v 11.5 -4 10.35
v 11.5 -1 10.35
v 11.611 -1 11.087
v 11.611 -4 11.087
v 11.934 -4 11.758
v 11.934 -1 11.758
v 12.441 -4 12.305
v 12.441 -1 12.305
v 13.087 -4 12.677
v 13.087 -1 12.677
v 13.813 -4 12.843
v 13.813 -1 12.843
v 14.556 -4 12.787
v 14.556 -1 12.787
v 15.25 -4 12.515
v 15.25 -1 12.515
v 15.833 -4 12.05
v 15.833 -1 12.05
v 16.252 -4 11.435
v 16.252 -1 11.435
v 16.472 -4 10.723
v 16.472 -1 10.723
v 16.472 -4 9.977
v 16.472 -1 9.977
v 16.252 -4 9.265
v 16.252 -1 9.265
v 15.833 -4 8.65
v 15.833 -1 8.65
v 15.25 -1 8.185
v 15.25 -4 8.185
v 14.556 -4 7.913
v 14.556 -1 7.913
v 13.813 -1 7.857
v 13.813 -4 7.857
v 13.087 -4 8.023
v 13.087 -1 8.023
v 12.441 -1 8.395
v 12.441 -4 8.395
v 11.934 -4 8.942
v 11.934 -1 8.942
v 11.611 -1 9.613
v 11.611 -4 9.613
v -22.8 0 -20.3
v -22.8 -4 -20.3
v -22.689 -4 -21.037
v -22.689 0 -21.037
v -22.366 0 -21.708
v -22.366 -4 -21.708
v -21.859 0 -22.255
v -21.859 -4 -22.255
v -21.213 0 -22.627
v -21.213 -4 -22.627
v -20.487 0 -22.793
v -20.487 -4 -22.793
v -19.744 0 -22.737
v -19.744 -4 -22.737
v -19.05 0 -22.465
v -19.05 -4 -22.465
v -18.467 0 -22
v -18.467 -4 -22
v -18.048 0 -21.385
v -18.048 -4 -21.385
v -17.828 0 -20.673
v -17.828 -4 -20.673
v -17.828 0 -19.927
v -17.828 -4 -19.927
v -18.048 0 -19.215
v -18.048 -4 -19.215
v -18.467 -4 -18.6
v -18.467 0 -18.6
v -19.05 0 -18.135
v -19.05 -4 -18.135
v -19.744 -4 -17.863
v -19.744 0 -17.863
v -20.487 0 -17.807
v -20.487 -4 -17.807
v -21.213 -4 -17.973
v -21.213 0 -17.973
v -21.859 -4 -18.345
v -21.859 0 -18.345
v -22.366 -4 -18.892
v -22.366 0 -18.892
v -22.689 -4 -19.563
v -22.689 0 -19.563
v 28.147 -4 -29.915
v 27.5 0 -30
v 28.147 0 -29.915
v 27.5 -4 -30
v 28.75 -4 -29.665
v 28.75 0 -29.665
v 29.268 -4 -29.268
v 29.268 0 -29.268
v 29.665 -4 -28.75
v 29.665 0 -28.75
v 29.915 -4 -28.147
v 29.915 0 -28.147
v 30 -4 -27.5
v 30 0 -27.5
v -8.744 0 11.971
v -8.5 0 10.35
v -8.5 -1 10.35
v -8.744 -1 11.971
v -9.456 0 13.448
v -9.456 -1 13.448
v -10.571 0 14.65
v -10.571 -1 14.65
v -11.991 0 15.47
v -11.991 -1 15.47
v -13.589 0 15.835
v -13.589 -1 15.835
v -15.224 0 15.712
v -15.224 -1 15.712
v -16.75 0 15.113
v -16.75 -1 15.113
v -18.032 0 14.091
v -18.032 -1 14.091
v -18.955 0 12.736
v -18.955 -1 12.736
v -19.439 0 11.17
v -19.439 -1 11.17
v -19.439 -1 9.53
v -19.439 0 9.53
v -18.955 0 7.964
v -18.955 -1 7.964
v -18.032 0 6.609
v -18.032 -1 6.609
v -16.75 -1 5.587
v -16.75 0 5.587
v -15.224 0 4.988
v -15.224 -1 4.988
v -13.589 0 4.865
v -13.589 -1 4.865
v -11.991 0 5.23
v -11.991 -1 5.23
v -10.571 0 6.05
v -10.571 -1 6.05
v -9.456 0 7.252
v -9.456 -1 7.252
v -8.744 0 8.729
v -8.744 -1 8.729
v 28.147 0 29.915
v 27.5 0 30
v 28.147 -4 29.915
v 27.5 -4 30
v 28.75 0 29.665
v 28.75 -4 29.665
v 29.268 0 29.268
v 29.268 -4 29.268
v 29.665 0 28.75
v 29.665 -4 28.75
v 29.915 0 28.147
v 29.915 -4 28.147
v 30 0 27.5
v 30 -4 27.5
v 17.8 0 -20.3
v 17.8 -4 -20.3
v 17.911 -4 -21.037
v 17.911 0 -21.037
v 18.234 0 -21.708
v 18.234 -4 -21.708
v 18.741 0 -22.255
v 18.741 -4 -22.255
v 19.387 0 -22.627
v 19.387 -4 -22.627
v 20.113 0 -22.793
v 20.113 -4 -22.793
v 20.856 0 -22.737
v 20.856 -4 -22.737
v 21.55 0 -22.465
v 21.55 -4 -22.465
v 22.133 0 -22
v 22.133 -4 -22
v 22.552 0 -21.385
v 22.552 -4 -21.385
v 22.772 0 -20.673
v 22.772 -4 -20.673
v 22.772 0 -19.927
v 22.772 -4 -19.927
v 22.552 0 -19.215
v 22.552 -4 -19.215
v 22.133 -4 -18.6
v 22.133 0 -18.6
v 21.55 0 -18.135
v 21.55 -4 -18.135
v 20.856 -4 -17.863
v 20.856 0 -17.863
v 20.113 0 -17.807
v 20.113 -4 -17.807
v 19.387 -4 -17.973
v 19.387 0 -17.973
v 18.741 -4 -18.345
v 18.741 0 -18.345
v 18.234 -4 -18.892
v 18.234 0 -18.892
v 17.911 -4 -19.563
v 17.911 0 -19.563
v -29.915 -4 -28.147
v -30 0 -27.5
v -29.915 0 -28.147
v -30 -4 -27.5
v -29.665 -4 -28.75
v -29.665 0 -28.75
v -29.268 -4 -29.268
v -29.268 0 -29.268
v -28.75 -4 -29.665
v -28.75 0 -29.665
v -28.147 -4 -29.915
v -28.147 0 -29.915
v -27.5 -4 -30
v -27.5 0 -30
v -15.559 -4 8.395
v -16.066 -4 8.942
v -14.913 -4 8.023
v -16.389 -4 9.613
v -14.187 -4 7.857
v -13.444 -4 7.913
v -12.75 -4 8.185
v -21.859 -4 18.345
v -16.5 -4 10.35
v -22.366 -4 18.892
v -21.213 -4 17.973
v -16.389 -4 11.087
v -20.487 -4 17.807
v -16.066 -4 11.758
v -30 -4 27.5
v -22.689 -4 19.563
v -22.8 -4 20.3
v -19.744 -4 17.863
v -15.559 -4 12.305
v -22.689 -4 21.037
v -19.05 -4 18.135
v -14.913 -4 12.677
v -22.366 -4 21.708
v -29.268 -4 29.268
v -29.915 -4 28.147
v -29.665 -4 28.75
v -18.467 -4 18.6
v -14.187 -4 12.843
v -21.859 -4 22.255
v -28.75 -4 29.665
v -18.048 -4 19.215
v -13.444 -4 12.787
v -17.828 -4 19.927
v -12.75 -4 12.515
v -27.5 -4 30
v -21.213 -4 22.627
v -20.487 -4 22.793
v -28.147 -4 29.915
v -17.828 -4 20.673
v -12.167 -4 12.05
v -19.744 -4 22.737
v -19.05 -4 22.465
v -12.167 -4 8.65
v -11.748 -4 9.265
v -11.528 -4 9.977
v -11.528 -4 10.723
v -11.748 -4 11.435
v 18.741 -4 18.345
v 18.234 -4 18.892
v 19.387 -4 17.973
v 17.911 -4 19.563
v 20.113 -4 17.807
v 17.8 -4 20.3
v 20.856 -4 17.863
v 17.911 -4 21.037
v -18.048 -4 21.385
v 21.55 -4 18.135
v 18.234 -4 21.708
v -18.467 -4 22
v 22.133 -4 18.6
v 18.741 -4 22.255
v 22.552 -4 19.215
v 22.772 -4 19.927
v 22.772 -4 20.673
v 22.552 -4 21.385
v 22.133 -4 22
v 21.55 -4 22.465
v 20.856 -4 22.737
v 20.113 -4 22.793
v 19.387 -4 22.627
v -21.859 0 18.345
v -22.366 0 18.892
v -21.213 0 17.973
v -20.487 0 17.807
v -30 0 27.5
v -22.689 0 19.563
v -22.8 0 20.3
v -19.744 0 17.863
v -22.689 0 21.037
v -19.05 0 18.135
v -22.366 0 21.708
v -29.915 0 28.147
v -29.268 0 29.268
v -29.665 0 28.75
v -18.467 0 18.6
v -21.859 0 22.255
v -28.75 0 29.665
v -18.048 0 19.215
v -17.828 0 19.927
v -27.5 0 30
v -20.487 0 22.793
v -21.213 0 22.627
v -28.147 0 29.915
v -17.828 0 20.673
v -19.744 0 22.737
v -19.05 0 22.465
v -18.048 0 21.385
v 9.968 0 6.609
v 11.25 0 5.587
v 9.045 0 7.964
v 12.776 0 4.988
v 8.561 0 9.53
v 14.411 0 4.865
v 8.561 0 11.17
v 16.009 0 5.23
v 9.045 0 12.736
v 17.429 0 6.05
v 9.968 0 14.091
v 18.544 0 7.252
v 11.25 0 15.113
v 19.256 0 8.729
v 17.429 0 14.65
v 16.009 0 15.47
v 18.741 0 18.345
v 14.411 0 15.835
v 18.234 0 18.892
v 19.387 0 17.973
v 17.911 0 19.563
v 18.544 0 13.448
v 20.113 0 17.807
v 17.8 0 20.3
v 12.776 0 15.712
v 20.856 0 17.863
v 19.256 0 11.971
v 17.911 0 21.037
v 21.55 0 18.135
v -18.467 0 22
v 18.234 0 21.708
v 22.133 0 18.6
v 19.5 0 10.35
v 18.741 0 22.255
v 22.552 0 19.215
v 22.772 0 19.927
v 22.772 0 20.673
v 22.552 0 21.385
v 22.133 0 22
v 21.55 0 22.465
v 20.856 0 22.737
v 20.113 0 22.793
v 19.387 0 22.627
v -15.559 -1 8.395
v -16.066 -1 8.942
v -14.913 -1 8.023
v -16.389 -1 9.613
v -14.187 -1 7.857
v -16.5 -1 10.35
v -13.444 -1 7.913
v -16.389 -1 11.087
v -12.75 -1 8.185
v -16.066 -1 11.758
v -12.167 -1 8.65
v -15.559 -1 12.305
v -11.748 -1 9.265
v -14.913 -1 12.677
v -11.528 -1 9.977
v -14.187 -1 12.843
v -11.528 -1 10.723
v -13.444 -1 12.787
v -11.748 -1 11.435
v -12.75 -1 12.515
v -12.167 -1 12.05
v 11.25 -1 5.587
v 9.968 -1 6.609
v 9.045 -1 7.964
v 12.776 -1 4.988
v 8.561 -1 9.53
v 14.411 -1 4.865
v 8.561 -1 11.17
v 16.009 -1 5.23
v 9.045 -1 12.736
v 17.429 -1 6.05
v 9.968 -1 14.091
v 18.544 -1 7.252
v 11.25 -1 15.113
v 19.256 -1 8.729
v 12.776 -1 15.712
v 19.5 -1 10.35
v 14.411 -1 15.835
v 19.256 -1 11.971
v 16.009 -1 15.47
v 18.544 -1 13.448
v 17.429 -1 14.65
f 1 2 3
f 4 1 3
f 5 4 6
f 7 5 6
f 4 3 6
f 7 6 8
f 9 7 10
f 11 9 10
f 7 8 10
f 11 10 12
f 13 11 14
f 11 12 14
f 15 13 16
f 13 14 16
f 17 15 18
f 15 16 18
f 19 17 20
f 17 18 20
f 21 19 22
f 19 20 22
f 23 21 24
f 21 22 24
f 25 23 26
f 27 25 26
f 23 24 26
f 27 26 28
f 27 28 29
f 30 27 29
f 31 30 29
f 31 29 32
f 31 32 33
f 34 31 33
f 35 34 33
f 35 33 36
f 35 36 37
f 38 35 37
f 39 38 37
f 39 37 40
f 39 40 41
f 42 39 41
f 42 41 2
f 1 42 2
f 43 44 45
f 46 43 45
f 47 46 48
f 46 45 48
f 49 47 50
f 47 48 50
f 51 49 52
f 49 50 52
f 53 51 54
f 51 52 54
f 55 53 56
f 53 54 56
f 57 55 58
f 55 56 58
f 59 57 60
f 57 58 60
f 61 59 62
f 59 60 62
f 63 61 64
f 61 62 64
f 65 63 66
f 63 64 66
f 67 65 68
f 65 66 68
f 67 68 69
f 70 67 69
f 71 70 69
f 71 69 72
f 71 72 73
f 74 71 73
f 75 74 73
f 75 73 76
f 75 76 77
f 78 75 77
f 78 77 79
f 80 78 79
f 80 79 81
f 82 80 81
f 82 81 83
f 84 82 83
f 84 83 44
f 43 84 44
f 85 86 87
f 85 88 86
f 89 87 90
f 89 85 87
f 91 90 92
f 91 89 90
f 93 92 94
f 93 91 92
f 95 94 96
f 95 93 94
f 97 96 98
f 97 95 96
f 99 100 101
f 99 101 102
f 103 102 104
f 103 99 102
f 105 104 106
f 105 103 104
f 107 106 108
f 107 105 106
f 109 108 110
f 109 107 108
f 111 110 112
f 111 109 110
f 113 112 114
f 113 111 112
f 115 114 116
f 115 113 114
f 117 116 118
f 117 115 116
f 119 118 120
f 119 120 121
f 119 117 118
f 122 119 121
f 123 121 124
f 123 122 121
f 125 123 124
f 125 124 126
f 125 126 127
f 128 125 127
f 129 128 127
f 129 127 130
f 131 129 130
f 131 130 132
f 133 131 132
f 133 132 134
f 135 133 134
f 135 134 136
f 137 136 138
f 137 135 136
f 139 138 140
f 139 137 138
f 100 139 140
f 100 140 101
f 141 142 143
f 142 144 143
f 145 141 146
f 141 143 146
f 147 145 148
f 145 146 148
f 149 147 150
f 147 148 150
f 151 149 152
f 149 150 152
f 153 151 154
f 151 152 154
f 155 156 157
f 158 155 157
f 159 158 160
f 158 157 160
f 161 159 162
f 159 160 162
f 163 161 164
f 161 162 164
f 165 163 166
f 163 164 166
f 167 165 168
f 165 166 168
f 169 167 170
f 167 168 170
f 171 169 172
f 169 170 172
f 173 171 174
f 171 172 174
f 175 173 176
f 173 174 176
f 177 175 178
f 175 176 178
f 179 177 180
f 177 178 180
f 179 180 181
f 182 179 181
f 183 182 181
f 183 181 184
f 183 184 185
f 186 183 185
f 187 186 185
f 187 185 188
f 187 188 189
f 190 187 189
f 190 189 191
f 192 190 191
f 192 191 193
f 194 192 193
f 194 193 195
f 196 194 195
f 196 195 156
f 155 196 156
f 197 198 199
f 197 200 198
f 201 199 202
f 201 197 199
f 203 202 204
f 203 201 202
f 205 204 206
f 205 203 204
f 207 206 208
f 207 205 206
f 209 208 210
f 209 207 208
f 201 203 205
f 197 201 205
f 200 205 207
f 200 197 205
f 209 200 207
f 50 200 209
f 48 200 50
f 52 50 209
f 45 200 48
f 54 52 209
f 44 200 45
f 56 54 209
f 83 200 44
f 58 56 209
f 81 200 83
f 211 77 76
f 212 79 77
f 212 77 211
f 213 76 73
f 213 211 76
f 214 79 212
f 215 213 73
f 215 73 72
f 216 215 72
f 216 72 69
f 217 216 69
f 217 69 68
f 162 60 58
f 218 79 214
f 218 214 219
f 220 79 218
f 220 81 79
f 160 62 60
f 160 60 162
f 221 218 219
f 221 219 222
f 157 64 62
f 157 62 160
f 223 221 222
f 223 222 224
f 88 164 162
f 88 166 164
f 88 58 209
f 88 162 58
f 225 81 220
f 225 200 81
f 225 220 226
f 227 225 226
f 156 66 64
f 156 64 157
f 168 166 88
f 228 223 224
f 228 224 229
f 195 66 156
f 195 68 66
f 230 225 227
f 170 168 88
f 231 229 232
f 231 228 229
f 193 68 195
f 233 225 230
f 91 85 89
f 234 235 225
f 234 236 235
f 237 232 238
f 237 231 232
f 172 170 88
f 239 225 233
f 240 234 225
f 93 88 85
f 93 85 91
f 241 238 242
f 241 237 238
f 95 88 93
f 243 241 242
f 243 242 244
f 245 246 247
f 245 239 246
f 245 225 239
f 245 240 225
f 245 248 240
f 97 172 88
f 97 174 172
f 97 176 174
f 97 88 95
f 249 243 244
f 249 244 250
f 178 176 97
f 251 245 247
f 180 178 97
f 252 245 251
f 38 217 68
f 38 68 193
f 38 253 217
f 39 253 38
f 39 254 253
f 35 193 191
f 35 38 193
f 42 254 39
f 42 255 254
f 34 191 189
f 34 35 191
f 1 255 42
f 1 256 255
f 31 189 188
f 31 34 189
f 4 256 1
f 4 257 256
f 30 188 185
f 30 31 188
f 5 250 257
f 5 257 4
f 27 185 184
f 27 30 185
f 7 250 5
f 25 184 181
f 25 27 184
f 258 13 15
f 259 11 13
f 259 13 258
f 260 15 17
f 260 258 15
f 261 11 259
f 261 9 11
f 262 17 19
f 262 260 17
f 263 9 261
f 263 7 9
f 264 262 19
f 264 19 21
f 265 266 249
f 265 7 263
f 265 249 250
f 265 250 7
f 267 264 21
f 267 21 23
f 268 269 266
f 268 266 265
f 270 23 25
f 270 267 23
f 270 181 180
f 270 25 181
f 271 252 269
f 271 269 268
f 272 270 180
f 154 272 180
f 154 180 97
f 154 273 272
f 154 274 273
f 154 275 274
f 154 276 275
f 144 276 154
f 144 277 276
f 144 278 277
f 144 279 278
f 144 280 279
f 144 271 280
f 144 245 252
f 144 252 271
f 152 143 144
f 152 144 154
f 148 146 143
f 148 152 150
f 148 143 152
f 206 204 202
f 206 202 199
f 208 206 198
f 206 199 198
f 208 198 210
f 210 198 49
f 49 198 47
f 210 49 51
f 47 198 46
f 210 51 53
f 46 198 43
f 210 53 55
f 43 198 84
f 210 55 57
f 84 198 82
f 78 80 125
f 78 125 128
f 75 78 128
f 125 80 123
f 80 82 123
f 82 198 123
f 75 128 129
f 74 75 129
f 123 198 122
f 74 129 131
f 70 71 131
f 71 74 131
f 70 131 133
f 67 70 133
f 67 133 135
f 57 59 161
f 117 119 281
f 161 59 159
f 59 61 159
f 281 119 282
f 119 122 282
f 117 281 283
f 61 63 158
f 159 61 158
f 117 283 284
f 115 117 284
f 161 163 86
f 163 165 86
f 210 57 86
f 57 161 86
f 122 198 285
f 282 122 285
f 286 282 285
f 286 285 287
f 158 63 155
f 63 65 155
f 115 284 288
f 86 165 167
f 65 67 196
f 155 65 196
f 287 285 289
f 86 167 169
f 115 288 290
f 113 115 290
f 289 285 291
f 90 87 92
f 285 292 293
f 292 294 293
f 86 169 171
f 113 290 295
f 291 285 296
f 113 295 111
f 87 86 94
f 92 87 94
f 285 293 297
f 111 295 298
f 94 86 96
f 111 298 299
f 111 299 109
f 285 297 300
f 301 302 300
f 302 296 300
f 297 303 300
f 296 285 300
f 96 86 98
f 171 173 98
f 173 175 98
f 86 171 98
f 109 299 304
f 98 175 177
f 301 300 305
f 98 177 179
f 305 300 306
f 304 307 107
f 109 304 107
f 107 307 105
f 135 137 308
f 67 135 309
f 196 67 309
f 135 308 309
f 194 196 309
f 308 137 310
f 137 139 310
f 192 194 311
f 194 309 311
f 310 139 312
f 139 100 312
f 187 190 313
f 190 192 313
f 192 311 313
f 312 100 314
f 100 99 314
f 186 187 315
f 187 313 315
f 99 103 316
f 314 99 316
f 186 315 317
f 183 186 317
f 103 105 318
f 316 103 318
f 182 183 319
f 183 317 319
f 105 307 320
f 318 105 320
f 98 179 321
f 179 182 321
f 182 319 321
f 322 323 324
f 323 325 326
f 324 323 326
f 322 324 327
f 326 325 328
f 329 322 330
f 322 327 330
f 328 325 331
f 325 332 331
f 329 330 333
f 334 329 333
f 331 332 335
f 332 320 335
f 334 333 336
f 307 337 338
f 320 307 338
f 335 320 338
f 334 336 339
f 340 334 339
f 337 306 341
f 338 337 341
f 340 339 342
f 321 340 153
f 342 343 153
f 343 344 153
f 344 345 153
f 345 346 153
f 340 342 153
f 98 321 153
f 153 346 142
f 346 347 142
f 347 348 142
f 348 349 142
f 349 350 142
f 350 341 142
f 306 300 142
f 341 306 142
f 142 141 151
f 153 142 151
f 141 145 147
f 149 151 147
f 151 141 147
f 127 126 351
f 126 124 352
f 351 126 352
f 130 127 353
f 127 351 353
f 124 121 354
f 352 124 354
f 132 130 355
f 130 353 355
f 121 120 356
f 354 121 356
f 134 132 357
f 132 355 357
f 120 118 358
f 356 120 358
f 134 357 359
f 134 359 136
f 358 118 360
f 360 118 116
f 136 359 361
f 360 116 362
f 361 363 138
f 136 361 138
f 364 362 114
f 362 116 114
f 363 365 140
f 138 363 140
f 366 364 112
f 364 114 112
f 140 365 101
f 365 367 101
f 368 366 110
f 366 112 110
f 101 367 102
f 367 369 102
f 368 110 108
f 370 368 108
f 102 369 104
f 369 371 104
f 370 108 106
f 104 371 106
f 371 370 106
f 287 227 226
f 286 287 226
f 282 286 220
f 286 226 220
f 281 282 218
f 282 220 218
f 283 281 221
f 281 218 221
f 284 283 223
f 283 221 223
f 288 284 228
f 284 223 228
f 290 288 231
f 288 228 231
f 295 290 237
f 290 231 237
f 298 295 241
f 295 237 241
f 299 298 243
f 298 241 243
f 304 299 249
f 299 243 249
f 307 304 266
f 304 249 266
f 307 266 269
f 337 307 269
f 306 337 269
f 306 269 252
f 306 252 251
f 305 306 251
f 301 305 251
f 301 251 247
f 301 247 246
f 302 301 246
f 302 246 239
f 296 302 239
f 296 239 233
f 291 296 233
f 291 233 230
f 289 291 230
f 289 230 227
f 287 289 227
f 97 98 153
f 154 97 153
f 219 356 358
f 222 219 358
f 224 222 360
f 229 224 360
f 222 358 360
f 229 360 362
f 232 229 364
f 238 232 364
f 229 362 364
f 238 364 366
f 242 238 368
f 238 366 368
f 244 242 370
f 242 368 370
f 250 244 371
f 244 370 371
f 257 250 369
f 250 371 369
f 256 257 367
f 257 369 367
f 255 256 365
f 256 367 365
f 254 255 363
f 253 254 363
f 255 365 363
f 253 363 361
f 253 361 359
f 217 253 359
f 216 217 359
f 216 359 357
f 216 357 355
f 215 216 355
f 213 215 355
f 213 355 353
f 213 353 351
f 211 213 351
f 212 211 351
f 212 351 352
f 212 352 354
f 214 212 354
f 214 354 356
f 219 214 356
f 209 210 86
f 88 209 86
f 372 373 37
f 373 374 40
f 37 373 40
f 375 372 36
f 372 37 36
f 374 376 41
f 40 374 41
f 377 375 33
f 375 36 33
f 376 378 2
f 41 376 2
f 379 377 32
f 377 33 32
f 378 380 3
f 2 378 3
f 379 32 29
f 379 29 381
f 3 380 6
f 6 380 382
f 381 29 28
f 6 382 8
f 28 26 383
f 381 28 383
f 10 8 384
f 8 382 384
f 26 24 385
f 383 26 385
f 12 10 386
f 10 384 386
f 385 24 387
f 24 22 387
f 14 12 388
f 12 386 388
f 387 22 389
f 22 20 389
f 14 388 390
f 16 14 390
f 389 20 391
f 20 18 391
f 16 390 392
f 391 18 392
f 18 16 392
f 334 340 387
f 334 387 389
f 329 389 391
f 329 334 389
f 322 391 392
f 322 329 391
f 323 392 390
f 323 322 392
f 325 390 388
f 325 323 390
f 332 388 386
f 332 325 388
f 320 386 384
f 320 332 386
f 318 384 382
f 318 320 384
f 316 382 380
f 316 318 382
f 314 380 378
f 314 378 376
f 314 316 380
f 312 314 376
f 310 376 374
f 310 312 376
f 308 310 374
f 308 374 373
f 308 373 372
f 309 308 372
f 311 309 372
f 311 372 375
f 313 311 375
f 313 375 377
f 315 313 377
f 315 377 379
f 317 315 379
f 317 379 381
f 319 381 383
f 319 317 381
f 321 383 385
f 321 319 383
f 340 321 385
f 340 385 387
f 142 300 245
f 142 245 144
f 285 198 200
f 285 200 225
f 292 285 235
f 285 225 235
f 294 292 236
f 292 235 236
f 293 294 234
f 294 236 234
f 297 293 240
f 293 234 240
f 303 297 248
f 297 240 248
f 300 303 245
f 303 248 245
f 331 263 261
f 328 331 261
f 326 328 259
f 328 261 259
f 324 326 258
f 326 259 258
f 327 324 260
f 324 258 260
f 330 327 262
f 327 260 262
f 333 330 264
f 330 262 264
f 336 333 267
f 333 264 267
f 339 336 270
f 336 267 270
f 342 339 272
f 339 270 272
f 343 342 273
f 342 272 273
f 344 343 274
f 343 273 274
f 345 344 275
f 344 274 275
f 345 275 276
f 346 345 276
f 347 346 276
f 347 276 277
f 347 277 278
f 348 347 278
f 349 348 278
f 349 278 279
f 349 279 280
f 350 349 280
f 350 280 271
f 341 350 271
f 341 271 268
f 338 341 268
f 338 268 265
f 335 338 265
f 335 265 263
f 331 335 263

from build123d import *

# Parameters (mm, degrees)
F0_W     = 60
F0_H     = 60
F1_DEPTH = 4
F2_D     = 5
F4_D     = 5
F5_R     = 5.5
F6_DEPTH = 1
F7_R     = 2.5


with BuildPart() as f1:
    # F0 (on Front) → F1 (new body)
    with BuildSketch(Plane.XZ):
        Rectangle(F0_W, F0_H)
    extrude(amount=F1_DEPTH)

    # F2 (through all)
    with Locations(Plane(origin=(0, 0, 0), x_dir=(1, 0, 0), z_dir=(0, 1, 0))):
        with Locations((-20.3, -20.3), (20.3, -20.3), (20.3, 20.3), (-20.3, 20.3)):
            Hole(F2_D / 2)

    # F4 (through all)
    with Locations(Plane.XZ.offset(4)):
        with Locations((-14, 10.35), (14, 10.35)):
            Hole(F4_D / 2)

    # F5 (on face) → F6 (cut)
    with BuildSketch(Plane.XZ):
        with Locations((14, 10.35)):
            Circle(F5_R)
        with Locations((-14, 10.35)):
            Circle(F5_R)
    extrude(amount=F6_DEPTH, mode=Mode.SUBTRACT)

    # F7
    f7_edges = [f1.edges().sort_by_distance(p)[0] for p in [
        (30, -2, 30),
        (30, -2, -30),
        (-30, -2, -30),
        (-30, -2, 30),
    ]]
    fillet(f7_edges, radius=F7_R)


solid = f1.part
